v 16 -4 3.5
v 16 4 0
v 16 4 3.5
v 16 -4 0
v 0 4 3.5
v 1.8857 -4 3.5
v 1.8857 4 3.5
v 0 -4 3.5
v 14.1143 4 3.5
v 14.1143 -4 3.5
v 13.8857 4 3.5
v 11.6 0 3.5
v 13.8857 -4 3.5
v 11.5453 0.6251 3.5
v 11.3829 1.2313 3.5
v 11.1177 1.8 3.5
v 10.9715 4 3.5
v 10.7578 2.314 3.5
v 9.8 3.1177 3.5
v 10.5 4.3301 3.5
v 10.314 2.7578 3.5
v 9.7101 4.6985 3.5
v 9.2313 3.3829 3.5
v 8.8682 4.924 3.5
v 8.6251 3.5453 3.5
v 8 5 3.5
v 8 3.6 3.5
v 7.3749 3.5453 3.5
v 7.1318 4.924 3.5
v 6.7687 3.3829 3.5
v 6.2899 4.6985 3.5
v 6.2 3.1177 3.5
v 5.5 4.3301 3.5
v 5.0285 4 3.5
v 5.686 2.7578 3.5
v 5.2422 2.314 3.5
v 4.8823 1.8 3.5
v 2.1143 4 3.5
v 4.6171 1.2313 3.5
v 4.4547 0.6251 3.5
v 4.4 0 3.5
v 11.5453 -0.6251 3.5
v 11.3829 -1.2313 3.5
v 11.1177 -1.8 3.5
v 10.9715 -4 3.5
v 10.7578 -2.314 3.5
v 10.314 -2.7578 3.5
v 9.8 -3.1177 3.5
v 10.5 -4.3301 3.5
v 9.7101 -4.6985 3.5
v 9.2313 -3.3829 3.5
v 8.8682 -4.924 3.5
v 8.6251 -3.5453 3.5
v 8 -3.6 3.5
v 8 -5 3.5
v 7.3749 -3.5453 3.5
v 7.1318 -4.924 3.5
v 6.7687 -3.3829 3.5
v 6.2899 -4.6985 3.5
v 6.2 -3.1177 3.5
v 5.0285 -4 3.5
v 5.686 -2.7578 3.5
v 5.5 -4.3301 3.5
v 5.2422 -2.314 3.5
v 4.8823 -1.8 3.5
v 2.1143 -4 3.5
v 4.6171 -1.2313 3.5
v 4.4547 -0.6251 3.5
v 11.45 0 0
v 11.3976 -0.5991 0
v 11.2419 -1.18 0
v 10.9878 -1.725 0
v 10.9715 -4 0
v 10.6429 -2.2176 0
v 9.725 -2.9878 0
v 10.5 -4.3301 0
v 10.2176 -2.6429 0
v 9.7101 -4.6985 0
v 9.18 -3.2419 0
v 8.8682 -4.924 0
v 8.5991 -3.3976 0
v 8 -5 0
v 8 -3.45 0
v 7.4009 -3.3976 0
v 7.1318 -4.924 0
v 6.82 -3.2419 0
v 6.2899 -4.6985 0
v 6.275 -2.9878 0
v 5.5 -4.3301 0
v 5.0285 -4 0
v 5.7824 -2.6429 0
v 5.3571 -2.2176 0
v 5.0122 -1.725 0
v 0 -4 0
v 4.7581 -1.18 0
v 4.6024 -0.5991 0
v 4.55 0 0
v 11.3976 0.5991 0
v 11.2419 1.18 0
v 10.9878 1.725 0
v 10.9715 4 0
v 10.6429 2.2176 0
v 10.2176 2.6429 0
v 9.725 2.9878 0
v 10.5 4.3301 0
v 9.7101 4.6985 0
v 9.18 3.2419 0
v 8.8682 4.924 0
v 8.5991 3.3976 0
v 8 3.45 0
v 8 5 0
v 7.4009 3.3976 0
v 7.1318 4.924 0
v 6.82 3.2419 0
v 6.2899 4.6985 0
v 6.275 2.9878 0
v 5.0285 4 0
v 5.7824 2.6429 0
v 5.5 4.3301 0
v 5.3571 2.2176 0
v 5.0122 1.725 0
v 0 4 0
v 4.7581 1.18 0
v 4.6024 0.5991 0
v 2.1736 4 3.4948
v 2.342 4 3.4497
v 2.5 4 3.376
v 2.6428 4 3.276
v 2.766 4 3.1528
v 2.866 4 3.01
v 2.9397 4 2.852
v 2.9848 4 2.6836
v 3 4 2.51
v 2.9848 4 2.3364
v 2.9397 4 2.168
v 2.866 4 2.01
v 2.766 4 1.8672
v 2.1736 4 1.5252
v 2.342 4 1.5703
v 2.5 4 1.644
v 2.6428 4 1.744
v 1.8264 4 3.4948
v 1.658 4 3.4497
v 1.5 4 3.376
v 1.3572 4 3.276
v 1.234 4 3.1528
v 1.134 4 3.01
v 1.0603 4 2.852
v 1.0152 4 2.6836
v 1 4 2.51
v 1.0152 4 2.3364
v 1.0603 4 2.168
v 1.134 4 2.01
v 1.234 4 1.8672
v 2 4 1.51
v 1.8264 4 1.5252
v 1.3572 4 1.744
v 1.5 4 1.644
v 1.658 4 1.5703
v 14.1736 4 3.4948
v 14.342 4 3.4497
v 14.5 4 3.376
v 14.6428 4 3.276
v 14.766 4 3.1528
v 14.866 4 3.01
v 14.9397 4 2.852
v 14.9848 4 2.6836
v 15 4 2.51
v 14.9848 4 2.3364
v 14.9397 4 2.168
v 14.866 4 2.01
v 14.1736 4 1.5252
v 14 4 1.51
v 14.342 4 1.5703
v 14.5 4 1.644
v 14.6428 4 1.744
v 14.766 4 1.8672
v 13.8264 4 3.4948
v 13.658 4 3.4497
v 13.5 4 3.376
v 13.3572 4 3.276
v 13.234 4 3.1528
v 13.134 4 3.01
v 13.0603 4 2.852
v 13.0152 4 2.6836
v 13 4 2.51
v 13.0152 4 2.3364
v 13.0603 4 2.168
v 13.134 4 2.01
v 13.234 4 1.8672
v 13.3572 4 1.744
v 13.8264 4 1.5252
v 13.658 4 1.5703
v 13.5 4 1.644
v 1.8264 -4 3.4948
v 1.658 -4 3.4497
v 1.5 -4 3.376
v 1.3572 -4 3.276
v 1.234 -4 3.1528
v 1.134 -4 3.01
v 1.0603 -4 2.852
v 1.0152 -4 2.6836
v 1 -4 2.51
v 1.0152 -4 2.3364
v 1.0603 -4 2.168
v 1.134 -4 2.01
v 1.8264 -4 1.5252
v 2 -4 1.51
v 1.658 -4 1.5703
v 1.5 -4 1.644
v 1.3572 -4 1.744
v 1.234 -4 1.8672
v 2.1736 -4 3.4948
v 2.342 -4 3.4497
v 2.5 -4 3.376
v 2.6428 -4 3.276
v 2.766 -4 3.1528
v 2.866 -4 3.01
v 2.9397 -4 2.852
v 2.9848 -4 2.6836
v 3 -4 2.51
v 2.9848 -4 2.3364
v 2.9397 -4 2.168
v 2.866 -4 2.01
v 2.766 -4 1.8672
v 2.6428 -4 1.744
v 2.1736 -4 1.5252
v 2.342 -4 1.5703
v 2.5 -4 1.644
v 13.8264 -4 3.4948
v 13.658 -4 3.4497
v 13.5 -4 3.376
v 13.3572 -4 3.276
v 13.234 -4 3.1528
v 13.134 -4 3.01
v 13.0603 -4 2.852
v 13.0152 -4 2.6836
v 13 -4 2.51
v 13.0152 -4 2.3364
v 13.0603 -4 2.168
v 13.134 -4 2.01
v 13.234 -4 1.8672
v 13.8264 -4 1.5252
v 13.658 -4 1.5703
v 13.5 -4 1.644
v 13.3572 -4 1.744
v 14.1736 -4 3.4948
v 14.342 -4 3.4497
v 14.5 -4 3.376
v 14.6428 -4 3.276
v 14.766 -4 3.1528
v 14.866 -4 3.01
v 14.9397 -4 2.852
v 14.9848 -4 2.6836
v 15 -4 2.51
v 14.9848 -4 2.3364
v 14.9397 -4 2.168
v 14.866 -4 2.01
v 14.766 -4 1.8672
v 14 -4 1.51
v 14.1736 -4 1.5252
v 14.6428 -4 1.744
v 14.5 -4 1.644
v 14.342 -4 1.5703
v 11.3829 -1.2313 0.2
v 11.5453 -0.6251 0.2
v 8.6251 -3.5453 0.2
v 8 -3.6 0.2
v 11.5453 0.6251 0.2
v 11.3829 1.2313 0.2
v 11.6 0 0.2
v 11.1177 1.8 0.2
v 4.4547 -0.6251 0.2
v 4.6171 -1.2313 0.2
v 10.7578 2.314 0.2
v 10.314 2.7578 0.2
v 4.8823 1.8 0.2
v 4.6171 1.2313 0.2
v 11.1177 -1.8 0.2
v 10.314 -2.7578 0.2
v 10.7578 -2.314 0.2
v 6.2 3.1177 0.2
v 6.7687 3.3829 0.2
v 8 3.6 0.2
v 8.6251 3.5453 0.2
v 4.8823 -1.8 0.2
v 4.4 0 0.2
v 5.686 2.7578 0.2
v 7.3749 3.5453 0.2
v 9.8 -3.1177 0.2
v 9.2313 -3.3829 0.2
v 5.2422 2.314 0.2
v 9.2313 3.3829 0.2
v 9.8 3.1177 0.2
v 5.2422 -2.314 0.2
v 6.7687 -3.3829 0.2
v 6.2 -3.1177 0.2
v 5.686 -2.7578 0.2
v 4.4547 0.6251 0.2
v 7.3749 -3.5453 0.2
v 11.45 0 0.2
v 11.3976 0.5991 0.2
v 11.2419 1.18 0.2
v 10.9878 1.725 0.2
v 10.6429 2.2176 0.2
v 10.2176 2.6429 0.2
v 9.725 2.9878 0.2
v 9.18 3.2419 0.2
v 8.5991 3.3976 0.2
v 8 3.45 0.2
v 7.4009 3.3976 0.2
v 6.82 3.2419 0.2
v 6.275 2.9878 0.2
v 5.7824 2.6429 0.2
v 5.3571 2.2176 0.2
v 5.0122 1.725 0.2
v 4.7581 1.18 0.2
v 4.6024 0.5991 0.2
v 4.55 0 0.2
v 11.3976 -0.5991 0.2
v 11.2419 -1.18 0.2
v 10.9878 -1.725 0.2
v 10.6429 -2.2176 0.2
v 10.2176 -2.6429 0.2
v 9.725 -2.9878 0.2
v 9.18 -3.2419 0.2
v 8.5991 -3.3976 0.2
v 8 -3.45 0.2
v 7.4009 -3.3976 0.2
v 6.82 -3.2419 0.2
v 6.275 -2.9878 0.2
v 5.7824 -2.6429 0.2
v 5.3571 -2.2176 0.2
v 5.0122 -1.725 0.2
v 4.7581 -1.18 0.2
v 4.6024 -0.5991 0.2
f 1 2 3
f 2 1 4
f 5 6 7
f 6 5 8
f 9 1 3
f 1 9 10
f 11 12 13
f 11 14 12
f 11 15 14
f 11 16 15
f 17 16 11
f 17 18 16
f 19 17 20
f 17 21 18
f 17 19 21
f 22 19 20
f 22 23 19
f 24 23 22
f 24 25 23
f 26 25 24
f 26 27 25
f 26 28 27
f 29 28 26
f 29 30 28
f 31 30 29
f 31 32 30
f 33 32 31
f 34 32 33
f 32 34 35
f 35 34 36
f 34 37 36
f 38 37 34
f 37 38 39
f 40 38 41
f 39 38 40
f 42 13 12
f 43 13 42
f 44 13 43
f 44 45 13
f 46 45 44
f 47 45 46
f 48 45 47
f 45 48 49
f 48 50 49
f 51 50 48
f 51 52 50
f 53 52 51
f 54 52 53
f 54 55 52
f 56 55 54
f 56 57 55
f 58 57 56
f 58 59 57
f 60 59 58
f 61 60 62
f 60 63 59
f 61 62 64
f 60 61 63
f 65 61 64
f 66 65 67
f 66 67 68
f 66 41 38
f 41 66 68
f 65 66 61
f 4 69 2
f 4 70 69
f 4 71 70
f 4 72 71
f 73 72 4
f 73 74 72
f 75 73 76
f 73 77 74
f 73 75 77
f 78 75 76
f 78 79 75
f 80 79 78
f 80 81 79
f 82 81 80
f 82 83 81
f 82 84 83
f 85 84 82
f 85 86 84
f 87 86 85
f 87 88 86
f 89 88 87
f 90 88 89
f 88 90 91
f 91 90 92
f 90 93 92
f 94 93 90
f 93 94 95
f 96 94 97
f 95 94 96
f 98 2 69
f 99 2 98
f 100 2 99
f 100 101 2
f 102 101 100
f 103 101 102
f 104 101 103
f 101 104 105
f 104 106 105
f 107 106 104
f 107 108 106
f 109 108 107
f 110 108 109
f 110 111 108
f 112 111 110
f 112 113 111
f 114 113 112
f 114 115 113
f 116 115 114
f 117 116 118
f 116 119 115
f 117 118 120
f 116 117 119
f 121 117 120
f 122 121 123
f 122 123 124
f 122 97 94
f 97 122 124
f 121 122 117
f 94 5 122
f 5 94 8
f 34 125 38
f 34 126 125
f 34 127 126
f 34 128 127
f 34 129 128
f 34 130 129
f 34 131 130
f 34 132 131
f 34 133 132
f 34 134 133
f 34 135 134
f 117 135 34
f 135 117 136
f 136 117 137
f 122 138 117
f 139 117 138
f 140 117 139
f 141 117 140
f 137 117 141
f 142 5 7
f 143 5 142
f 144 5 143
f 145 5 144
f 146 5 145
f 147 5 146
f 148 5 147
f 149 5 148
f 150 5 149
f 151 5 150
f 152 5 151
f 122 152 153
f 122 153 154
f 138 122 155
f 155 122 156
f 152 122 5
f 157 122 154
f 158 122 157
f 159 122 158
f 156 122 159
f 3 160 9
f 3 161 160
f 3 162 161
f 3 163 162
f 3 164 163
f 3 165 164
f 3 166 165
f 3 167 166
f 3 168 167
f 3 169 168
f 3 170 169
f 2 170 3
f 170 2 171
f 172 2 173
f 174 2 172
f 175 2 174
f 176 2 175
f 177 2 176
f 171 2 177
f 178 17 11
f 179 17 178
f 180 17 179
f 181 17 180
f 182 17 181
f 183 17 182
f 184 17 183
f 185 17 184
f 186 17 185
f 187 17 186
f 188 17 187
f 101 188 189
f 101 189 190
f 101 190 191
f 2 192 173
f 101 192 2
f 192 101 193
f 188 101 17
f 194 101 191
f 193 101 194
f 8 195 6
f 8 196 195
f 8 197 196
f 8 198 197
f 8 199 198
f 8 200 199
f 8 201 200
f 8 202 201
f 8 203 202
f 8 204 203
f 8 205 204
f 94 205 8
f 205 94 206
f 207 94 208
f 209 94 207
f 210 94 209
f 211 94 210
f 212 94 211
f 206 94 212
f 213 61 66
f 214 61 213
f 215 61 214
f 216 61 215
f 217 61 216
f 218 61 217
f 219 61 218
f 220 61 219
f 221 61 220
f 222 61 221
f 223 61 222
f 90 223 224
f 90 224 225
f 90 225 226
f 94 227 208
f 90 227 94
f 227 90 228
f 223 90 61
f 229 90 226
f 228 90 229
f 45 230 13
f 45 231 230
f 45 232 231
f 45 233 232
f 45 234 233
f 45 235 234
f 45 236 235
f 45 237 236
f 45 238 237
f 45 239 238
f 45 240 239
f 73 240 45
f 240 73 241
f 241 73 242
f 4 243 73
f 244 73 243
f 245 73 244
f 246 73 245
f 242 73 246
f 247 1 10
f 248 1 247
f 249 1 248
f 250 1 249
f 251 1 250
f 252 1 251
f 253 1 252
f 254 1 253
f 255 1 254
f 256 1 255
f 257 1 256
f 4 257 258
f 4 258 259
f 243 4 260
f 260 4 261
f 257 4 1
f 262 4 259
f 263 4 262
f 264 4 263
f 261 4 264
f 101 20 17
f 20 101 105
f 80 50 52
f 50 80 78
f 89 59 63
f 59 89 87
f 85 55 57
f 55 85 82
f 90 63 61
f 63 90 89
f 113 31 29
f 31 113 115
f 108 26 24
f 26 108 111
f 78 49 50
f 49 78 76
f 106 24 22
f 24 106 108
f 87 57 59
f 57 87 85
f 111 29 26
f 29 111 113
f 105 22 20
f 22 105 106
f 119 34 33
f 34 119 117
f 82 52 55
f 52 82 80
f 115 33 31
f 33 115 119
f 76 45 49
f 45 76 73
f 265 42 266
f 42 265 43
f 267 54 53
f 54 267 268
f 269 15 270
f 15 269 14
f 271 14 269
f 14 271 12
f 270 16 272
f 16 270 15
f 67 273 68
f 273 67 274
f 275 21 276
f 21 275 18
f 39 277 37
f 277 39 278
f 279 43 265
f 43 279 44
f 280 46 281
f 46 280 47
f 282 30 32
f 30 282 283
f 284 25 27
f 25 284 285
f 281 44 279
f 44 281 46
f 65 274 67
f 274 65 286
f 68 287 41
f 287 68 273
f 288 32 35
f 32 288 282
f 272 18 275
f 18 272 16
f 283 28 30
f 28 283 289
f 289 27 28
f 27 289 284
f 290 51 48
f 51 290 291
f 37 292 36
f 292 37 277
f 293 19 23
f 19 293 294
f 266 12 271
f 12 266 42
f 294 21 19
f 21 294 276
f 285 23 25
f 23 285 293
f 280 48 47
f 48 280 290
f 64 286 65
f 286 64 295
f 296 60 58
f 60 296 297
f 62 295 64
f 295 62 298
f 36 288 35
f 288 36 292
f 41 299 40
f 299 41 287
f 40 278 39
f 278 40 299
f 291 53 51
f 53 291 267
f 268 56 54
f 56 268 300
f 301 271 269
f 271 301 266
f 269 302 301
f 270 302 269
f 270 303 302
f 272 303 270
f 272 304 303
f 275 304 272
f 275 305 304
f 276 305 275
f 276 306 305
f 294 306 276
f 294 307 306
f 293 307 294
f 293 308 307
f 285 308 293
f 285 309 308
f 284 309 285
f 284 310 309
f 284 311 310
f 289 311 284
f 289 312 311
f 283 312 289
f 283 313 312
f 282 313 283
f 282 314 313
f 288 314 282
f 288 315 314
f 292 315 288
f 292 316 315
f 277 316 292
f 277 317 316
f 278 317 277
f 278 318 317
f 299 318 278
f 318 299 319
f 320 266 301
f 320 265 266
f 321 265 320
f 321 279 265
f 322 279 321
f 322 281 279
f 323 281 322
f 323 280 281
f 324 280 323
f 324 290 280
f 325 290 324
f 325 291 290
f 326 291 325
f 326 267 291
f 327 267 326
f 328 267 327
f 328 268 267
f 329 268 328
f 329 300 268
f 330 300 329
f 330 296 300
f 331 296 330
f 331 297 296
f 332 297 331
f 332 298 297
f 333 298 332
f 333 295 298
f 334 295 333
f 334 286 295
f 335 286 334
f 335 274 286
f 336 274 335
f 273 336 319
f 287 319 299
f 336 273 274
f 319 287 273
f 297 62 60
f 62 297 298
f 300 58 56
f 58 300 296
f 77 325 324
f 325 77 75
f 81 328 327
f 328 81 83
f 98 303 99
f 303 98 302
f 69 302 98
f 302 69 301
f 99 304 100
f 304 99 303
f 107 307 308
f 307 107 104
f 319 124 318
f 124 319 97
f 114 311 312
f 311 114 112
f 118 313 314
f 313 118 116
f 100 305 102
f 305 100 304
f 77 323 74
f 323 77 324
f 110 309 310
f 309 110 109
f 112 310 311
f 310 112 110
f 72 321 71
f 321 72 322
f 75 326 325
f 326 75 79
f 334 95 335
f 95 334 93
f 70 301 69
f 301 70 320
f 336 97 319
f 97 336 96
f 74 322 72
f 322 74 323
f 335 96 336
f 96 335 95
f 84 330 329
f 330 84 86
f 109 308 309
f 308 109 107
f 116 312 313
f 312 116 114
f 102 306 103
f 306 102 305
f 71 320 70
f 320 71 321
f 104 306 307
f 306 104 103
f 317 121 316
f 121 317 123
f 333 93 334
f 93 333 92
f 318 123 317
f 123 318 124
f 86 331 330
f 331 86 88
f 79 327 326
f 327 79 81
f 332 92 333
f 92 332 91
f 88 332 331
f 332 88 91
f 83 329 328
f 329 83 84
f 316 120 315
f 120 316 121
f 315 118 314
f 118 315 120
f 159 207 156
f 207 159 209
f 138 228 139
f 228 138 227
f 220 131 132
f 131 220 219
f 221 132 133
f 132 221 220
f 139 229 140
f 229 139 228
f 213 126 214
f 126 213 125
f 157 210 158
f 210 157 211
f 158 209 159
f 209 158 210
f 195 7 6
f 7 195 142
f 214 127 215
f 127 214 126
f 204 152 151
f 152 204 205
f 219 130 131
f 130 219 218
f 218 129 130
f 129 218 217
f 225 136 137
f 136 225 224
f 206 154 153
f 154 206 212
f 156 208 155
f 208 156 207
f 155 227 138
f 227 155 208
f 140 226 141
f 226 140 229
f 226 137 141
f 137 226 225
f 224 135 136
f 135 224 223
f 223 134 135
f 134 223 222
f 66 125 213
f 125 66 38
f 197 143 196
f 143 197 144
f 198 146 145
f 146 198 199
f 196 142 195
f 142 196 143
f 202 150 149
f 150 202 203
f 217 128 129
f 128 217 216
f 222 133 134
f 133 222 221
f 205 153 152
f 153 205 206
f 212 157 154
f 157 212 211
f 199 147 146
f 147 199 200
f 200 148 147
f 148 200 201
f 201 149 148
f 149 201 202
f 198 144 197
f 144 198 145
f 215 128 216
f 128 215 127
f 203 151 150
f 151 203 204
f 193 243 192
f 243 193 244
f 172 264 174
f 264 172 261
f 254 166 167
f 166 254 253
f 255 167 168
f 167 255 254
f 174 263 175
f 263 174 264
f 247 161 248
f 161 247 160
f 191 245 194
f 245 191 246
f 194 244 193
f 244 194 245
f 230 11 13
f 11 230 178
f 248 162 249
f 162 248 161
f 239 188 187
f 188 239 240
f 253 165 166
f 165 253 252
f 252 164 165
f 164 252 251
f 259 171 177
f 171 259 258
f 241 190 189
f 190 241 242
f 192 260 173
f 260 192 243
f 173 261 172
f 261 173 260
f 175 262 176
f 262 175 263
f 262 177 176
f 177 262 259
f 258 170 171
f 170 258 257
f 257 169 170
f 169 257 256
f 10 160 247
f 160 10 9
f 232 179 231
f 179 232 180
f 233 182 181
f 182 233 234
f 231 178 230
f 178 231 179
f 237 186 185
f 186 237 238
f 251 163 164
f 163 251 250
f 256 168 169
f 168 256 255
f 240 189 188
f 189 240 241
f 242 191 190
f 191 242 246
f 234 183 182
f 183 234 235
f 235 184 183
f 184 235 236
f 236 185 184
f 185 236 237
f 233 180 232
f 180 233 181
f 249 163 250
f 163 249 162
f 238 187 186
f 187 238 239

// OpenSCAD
// Customizable Simple Macro Lens Holder 
// preview[view:south, tilt:top];
/* [Parameters] */
lens_diameter = 7;

holder_height = 3.5;

rubber_band_hole_diameter = 2;



/* [Hidden] */
rubber_holder_width = 8;


module base() {        
    union() {
        translate([0, rubber_holder_width/-2, 0]) 
        cube([lens_diameter+3+rubber_band_hole_diameter*3,rubber_holder_width, holder_height]);        
        translate([(lens_diameter+3+rubber_band_hole_diameter*3)/2, 0, 0])
        cylinder(h=holder_height, r=(lens_diameter+3)/2, $fn=36);
    }
}
module holder() {
    difference() {
        base();
        
        translate([(lens_diameter+3+rubber_band_hole_diameter*3)/2, 0, 0.2])
        cylinder(h=holder_height, r=(lens_diameter+0.2)/2, $fn=36);
        
        translate([(lens_diameter+3+rubber_band_hole_diameter*3)/2, 0, -0.2])
        cylinder(h=holder_height, r=(lens_diameter-0.1)/2, $fn=36);
    
        translate([rubber_band_hole_diameter, (rubber_holder_width+1)/2, holder_height-rubber_band_hole_diameter/2+0.01]) rotate(a=[90,0,0]) 
        cylinder(h=rubber_holder_width+1, d=rubber_band_hole_diameter, $fn=36);
        

        translate([lens_diameter+3+rubber_band_hole_diameter*2, (rubber_holder_width+1)/2, holder_height-rubber_band_hole_diameter/2+0.01]) rotate(a=[90,0,0]) 
        cylinder(h=rubber_holder_width+1, d=rubber_band_hole_diameter, $fn=36);
    }
}

holder();
